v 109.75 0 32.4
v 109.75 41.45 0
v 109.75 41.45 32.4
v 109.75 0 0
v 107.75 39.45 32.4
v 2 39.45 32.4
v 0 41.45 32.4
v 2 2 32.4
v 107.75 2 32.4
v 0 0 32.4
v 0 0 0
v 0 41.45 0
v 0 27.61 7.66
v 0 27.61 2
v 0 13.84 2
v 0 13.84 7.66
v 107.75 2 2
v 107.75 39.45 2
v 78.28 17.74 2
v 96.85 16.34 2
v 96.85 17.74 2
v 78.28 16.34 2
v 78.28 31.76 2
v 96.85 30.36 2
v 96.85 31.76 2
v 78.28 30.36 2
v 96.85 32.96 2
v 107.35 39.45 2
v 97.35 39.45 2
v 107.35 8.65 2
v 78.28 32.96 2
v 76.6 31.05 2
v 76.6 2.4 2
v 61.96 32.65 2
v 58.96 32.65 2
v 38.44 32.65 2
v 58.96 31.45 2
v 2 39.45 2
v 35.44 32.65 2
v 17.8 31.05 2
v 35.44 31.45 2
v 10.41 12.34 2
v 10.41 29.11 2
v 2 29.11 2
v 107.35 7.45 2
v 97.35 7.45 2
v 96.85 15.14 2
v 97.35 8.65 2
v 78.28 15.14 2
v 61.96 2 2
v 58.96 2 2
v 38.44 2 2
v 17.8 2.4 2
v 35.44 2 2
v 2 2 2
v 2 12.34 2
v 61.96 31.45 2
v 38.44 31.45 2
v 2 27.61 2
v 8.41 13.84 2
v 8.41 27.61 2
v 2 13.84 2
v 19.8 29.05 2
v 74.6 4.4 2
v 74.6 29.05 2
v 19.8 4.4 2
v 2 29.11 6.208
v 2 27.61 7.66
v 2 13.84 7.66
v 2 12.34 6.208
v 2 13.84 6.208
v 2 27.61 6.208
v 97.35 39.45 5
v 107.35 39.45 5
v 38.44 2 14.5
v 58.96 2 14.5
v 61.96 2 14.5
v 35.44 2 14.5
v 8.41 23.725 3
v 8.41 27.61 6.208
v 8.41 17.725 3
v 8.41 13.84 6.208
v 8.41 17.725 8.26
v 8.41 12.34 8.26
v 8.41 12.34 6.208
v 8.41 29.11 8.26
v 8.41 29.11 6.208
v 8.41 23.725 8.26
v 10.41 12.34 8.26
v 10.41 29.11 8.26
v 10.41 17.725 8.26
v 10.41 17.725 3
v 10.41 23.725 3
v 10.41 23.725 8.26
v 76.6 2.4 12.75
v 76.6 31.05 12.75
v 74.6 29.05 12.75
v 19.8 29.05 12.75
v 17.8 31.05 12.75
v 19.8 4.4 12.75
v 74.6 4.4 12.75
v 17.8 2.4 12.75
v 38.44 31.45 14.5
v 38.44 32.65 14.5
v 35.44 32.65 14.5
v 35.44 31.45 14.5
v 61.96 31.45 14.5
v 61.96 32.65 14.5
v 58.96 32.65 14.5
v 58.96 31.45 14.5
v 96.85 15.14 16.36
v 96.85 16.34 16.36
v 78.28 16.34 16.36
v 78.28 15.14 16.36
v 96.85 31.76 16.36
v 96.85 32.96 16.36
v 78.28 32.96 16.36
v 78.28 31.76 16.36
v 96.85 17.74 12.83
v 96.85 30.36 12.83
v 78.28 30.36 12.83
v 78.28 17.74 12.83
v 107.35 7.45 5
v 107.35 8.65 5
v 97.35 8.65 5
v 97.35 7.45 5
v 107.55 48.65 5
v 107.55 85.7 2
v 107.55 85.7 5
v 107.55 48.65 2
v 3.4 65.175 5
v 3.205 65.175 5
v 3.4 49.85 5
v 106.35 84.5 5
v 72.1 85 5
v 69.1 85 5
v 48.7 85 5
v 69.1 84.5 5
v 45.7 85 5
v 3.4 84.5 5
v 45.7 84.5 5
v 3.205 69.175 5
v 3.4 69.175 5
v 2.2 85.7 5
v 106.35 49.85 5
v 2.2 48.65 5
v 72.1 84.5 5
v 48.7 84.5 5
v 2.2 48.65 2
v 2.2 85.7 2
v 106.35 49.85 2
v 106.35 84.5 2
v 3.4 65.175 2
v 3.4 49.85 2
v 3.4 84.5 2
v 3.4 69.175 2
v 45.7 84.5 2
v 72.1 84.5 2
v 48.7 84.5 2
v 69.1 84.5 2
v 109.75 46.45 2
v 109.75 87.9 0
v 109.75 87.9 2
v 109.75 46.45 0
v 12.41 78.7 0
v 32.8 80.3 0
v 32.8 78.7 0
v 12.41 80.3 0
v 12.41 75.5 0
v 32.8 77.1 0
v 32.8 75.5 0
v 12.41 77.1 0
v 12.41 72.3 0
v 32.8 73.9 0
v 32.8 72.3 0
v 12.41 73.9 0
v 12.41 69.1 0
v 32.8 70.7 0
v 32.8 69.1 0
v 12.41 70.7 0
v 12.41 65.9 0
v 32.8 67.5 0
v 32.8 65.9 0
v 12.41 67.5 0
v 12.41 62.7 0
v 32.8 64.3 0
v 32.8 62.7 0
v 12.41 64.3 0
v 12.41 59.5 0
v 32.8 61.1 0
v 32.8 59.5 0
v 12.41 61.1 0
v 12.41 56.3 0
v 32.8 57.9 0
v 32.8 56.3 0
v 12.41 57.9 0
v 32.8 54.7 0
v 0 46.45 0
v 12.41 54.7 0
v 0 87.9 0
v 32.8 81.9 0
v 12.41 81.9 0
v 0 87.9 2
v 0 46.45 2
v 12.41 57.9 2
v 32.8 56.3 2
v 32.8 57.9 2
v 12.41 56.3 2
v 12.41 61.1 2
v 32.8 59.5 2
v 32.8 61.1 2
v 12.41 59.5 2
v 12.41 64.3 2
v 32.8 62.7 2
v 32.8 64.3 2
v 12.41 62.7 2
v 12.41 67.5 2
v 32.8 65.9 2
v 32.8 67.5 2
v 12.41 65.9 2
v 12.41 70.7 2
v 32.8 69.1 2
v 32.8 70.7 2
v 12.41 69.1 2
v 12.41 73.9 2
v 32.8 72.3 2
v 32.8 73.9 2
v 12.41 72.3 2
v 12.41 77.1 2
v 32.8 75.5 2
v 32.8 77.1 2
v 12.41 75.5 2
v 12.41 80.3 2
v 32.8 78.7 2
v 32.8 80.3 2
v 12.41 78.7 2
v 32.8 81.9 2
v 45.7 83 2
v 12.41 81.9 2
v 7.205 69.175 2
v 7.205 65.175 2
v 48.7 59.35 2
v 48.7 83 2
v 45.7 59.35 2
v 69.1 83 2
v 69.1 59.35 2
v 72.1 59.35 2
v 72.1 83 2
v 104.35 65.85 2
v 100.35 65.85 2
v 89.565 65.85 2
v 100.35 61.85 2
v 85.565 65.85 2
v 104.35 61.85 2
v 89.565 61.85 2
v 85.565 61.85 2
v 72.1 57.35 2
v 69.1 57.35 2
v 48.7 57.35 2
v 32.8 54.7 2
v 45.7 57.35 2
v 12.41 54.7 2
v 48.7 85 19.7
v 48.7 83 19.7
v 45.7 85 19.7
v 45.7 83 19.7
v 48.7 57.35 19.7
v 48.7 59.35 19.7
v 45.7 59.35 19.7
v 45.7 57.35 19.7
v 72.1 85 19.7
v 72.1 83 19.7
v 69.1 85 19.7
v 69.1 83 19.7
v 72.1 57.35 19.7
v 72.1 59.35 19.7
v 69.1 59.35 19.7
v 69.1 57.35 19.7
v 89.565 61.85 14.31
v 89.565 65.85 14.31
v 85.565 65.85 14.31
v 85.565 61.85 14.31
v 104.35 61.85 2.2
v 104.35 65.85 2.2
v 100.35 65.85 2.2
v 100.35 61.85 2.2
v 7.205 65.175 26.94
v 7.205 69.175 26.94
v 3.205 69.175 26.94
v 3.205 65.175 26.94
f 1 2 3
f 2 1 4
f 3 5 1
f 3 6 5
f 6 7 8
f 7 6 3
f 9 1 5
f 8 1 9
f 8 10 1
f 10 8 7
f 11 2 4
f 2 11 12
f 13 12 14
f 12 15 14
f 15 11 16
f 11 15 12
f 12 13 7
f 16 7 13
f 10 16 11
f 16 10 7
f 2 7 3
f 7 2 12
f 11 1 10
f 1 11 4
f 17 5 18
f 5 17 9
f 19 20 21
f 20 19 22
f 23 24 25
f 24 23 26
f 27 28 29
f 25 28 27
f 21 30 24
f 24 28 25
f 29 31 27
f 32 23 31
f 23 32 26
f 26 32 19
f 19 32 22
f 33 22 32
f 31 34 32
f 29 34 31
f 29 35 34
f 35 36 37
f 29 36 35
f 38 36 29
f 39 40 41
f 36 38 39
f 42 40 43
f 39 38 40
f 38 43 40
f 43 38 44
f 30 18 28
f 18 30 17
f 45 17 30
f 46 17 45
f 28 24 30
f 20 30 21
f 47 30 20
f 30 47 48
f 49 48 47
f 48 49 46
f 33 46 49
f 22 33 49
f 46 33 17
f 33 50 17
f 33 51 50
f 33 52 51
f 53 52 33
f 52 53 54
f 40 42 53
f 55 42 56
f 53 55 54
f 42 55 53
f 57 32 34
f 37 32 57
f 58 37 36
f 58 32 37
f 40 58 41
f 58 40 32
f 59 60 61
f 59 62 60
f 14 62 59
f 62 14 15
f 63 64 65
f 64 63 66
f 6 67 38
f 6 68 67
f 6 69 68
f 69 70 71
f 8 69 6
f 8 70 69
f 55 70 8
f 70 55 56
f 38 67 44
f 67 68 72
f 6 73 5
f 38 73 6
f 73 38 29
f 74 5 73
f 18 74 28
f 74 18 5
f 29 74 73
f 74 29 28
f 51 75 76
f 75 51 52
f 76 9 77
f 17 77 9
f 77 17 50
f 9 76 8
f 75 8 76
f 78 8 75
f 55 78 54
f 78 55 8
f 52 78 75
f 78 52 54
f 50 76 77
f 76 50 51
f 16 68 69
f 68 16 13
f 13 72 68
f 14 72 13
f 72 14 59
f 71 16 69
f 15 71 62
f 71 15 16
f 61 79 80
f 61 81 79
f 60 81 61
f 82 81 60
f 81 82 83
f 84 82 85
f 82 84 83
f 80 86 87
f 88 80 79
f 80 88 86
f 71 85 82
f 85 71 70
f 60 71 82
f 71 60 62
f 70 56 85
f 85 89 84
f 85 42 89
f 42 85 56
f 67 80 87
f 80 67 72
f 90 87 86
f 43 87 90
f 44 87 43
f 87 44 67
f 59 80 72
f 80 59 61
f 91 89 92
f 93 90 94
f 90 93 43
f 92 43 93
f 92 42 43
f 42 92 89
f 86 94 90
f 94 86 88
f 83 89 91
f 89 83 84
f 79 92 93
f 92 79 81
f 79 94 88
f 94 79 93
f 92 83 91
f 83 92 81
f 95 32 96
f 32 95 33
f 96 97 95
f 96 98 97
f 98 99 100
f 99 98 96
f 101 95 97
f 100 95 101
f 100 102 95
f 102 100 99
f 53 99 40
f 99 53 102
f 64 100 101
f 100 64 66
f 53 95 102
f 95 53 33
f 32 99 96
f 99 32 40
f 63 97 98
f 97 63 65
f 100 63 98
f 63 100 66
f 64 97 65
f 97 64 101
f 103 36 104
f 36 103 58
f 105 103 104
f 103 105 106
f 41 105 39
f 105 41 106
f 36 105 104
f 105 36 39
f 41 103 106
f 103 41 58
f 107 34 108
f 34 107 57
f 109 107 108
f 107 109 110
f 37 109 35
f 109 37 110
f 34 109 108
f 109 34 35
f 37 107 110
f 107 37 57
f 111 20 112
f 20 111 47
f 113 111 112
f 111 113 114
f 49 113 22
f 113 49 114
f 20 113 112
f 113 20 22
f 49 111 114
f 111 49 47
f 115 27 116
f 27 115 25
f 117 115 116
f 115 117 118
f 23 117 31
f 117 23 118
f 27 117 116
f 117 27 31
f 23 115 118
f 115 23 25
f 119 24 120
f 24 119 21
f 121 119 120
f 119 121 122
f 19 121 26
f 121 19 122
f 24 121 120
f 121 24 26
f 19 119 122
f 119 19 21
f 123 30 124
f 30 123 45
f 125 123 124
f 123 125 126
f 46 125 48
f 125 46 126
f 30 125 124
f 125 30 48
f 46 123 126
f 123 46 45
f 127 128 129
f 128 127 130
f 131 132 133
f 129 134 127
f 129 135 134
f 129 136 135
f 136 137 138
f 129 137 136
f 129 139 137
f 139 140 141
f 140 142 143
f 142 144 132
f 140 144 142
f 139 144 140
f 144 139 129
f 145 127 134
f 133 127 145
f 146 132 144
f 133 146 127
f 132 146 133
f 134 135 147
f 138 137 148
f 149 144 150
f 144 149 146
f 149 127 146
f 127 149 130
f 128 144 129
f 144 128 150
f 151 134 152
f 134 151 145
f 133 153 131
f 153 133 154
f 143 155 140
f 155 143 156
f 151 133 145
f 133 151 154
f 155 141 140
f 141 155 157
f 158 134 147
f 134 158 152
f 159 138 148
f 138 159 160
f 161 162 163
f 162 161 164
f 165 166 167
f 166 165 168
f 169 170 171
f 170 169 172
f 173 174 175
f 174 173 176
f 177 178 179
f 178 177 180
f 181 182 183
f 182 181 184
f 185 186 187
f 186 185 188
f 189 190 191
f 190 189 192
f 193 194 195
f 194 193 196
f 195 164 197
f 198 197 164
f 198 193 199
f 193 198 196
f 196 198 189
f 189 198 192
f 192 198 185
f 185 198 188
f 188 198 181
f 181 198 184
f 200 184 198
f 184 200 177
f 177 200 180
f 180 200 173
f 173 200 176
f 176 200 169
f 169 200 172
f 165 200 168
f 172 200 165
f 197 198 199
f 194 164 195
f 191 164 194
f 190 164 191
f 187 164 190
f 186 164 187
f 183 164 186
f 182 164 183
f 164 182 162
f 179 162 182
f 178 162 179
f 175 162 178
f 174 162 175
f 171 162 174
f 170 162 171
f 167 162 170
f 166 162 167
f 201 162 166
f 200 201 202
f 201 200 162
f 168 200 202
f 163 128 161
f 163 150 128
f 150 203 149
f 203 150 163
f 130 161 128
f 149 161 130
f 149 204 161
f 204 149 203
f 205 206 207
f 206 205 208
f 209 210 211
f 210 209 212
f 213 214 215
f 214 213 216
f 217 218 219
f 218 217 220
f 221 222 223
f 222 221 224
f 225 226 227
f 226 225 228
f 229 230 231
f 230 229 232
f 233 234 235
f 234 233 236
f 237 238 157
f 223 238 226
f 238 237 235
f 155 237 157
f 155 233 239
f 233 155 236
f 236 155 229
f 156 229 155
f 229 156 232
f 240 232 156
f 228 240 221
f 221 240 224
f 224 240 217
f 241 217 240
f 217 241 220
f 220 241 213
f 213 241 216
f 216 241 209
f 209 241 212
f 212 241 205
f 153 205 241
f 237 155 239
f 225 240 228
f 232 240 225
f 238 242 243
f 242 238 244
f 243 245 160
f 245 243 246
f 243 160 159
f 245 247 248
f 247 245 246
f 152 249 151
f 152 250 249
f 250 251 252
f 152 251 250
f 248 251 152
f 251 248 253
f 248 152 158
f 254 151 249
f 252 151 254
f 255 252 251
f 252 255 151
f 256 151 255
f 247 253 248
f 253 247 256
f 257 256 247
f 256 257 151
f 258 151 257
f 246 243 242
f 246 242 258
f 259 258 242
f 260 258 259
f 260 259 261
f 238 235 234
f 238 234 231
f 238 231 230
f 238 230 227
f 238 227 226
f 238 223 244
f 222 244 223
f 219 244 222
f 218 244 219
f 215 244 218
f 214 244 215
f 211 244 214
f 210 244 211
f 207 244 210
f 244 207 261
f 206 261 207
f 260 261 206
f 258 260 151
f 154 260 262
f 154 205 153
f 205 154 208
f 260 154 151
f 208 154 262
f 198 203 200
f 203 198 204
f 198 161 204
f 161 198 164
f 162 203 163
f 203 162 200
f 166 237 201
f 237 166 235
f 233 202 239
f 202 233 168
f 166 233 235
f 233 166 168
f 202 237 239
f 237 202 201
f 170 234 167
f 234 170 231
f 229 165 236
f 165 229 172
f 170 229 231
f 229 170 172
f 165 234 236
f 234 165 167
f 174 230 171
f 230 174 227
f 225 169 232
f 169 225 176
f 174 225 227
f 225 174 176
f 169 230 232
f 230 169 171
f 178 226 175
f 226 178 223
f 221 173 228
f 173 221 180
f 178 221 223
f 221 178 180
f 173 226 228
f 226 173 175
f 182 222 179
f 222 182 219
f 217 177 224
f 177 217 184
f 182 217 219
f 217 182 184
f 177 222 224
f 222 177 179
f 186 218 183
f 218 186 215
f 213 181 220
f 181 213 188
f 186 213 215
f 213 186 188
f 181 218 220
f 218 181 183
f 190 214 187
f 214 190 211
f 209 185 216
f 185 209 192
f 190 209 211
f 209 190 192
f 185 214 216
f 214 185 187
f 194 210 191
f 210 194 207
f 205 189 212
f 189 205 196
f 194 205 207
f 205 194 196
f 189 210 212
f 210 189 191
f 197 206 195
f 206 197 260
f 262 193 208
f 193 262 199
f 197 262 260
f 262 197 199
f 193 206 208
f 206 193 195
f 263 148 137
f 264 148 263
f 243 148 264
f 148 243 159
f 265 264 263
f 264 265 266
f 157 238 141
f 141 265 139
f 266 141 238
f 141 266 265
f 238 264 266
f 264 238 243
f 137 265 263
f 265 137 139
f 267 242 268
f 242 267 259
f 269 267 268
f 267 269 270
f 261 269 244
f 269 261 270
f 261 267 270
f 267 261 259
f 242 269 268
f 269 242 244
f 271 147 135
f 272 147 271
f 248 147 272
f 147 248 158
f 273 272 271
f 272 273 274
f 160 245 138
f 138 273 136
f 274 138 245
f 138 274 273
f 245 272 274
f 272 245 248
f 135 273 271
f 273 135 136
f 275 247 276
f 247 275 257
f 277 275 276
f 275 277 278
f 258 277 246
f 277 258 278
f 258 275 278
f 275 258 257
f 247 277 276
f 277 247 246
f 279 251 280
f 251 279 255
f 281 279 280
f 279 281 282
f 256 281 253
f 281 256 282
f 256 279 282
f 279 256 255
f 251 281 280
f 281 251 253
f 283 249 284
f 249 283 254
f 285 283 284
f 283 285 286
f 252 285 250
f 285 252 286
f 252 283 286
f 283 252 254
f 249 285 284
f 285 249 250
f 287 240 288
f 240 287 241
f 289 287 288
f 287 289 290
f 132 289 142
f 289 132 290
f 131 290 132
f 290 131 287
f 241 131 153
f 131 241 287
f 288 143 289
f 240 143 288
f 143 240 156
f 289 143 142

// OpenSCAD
// Enclosure for wyze-esp-bridge:
//   USB-C power socket -> antenna overhang -> ESP32-S3-DevKitC-1 (flat, no headers)
//   -> USB-C-to-A OTG adapter -> Wyze Sense Bridge dongle standing like a plate across the +X end.
//
// All dimensions in mm. Parts are raised/offset automatically so the board's OTG port,
// the adapter and the dongle's USB-A plug line up; the case grows to fit.
// Render: F6, export STL: F7. Print base upright, lid plate-down (as laid out with part = "both").

/* [Part] */
part = "both"; // [both, base, lid]

/* [ESP32-S3 board] */
board_l = 58.8;    // PCB length (X), without antenna overhang
board_w = 28.65;   // PCB width (Y)
pcb_t = 1.75;      // PCB thickness
pin_h = 0;         // height of anything under the PCB (no headers soldered = 0)
comp_h = 3.0;      // tallest component above the PCB
port_off = 1.48;   // USB-C port centre above the PCB top
port_ovh = 1.18;   // USB-C ports stick out this far past the PCB edge (+X)
ant_ovh = 5.99;    // antenna overhang past the PCB (-X)
otg_y = 21.65;     // OTG port centre from the PCB's -Y edge
com_y = 7.0;       // COM port centre from the PCB's -Y edge (assumed mirror of otg_y; measure)

/* [OTG adapter, USB-C plug -> USB-A socket] */
otg_body = 20.75;  // PCB edge -> USB-A face, adapter plugged in
otg_bw = 14.62;    // body width (Y)
otg_bh = 7.06;     // body height (Z)
otg_cz = 3.15;     // USB-C plug centre above the body bottom
otg_az = 4.17;     // USB-A socket centre above the body bottom
otg_cy = 7.31;     // USB-C plug centre from the body's -Y side
otg_ay = 7.31;     // USB-A socket centre from the body's -Y side

/* [Wyze Sense Bridge dongle: PLACEHOLDERS, measure (back face toward you, plug horizontal)] */
dongle_w = 30;     // width (Y)
dongle_h = 30;     // height (Z)
dongle_t = 10;     // thickness (X), back face to front face, excluding the plug
plug_y = 15;       // plug centre from the dongle's -Y edge
plug_z = 15;       // plug centre above the dongle's bottom edge

/* [USB-C power socket (molded pigtail receptacle)] */
pwr_w = 13.37;     // width (Y)
pwr_h = 5.26;      // height (Z)
pwr_d = 8.21;      // body depth, front face -> wire exit (X)
pwr_clr = 0.2;     // fit clearance around the socket (snug; add a drop of glue)
pwr_notch = 6;     // wire notch width in the rear stop

/* [Case] */
wall = 2;
floor_t = 2;
lid_t = 2;
clr = 0.4;         // general fit clearance, tune for your printer
lip_h = 3;         // lid locating lip depth
lip_t = 1.2;       // lid lip thickness
tab_gap = 0.2;     // gap between hold-down tabs and the part they hold
tab_w = 4;         // hold-down tab footprint
vents = true;      // lid vents over the antenna end
com_slot = false;  // side slot for a right-angle USB-C cable into the COM port
com_slot_l = 12;   // slot length (X)
com_slot_h = 8;    // slot height (Z)
show_parts = false; // preview (F5) only: ghost models of the board, adapter, dongle and socket

$fn = 32;
eps = 0.01;

// ------------------------------------------------------------------ layout
// Interior coordinates: x = 0 at the inner -X wall face, y = 0 at the inner -Y wall face, z = 0 on the floor.

port_cz = pcb_t + port_off;  // port centre above the board bottom

// Z: lift the board until the adapter and the dongle clear the floor
zb = max(pin_h, otg_cz - port_cz, plug_z - otg_az + otg_cz - port_cz);
adp_z0 = zb + port_cz - otg_cz;
a_cz = adp_z0 + otg_az;
dng_z0 = a_cz - plug_z;

// X
stop_t = 2;
stop_x = pwr_d - wall + pwr_clr;          // socket front face sits flush with the outer wall
bay_l = stop_x + stop_t + 1;
bx0 = bay_l + ant_ovh + clr;              // board -X edge
bx1 = bx0 + board_l;                      // board +X edge (port side)
adp_x0 = bx1 + port_ovh;                  // adapter body start (approx.)
a_face = bx1 + otg_body;                  // USB-A face
dng_x1 = a_face + dongle_t;
in_l = dng_x1 + clr;

// Y (board frame: board -Y edge = 0)
adp_y0f = otg_y - otg_cy;
a_cyf = adp_y0f + otg_ay;
dng_y0f = a_cyf - plug_y;
y_min = min(0, adp_y0f, dng_y0f);
y_max = max(board_w, adp_y0f + otg_bw, dng_y0f + dongle_w);
by0 = clr - y_min;                        // board -Y edge in interior coordinates
in_w = max(y_max - y_min + 2 * clr, pwr_w + 2 * pwr_clr + 4);
adp_y0 = by0 + adp_y0f;
dng_y0 = by0 + dng_y0f;
pwr_yc = in_w / 2;

in_h = max(zb + pcb_t + comp_h, adp_z0 + otg_bh, dng_z0 + dongle_h, pwr_h + pwr_clr) + clr;

out_l = in_l + 2 * wall;
out_w = in_w + 2 * wall;
out_h = in_h + floor_t;

echo(str("Outer size (base): ", out_l, " x ", out_w, " x ", out_h, " mm, lid adds ", lid_t));
echo(str("Board lifted ", zb, " mm; adapter bottom ", adp_z0, "; dongle bottom ", dng_z0));
echo("WARNING: dongle_* and plug_* are placeholders until the Sense Bridge is measured.");

// ------------------------------------------------------------------ base

module in_frame() { translate([wall, wall, floor_t]) children(); }

module base() {
    difference() {
        cube([out_l, out_w, out_h]);
        in_frame() translate([0, 0, 0]) cube([in_l, in_w, in_h + eps]);
        // Power socket opening in the -X wall
        in_frame() translate([-wall - eps, pwr_yc - pwr_w / 2 - pwr_clr, 0])
            cube([wall + 2 * eps, pwr_w + 2 * pwr_clr, pwr_h + 2 * pwr_clr]);
        // Optional COM port side slot (-Y wall)
        if (com_slot)
            in_frame() translate([bx1 + port_ovh, -wall - eps, zb + port_cz - com_slot_h / 2])
                cube([com_slot_l, wall + 2 * eps, com_slot_h]);
    }
    in_frame() {
        power_cradle();
        board_supports();
        adapter_cradle();
        dongle_support();
    }
}

module power_cradle() {
    y0 = pwr_yc - pwr_w / 2 - pwr_clr;
    y1 = pwr_yc + pwr_w / 2 + pwr_clr;
    rail_h = pwr_h * 0.8;
    // Side guides
    for (y = [y0 - 1.5, y1]) translate([0, y, 0]) cube([stop_x, 1.5, rail_h]);
    // Rear stop with a wire notch
    difference() {
        translate([stop_x, y0 - 1.5, 0]) cube([stop_t, y1 - y0 + 3, pwr_h + 1]);
        translate([stop_x - eps, pwr_yc - pwr_notch / 2, 1]) cube([stop_t + 2 * eps, pwr_notch, pwr_h + 1]);
    }
}

module board_supports() {
    if (zb > 0.2) {
        // Rails under both long edges, plus a cross rib at each end
        for (y = [by0, by0 + board_w - 2]) translate([bx0, y, 0]) cube([board_l, 2, zb]);
        for (x = [bx0, bx1 - 2]) translate([x, by0, 0]) cube([2, board_w, zb]);
    }
    // Side locators: keep the board from sliding in Y
    loc_h = zb + pcb_t;
    for (x = [bx0 + board_l * 0.3, bx0 + board_l * 0.7]) {
        translate([x, by0 - clr - 1.2, 0]) cube([3, 1.2, loc_h]);
        translate([x, by0 + board_w + clr, 0]) cube([3, 1.2, loc_h]);
    }
}

module adapter_cradle() {
    len = a_face - adp_x0 - 1;
    // Support under the adapter body
    if (adp_z0 > 0.2) translate([adp_x0 + 0.5, adp_y0 + 1, 0]) cube([len, otg_bw - 2, adp_z0]);
    // Side walls to half the body height
    side_h = adp_z0 + otg_bh / 2;
    for (y = [adp_y0 - clr - 1.2, adp_y0 + otg_bw + clr])
        translate([adp_x0 + 0.5, y, 0]) cube([len, 1.2, side_h]);
}

module dongle_support() {
    if (dng_z0 > 0.2) translate([a_face + 0.5, dng_y0 + 1, 0]) cube([dongle_t - 1, dongle_w - 2, dng_z0]);
    // Low side guides
    for (y = [dng_y0 - clr - 1.2, dng_y0 + dongle_w + clr])
        translate([a_face, y, 0]) cube([dongle_t, 1.2, dng_z0 + 3]);
}

// ------------------------------------------------------------------ lid

// A hold-down tab hanging from the lid down to top_z (interior z) + tab_gap.
module tab(x, y, top_z, w = tab_w, d = tab_w) {
    len = in_h - top_z - tab_gap;
    if (len > 0) translate([x - w / 2, y - d / 2, top_z + tab_gap]) cube([w, d, len + eps]);
}

module lid() {
    difference() {
        union() {
            translate([0, 0, out_h]) cube([out_l, out_w, lid_t]);
            // Locating lip inside the walls
            in_frame() difference() {
                translate([clr / 2, clr / 2, in_h - lip_h]) cube([in_l - clr, in_w - clr, lip_h + eps]);
                translate([clr / 2 + lip_t, clr / 2 + lip_t, in_h - lip_h - eps])
                    cube([in_l - clr - 2 * lip_t, in_w - clr - 2 * lip_t, lip_h + 3 * eps]);
            }
        }
        if (vents) {
            vx0 = bay_l + 1;
            vx1 = bx0 + 15;
            for (y = [wall + 4 : 3.2 : out_w - wall - 5])
                translate([wall + vx0, y, out_h - eps]) cube([vx1 - vx0, 1.6, lid_t + 2 * eps]);
        }
    }
    in_frame() {
        // Board: press on the PCB edge strips
        for (x = [bx0 + board_l * 0.5, bx1 - 6])
            for (y = [by0 + 1.5, by0 + board_w - 1.5])
                tab(x, y, zb + pcb_t, w = 3, d = 2);
        tab((adp_x0 + a_face) / 2, adp_y0 + otg_bw / 2, adp_z0 + otg_bh);
        tab(a_face + dongle_t / 2, dng_y0 + dongle_w / 2, dng_z0 + dongle_h);
        tab(stop_x / 2, pwr_yc, pwr_h);
    }
}

// ------------------------------------------------------------------ fit check

module ghosts() {
    in_frame() {
        // Board + antenna overhang + components + ports
        color("green") translate([bx0, by0, zb]) cube([board_l, board_w, pcb_t]);
        color("green") translate([bx0 - ant_ovh, by0 + board_w / 2 - 9, zb]) cube([ant_ovh, 18, pcb_t]);
        color("silver") translate([bx0 + 2, by0 + 5, zb + pcb_t]) cube([25, 18, comp_h]);
        for (y = [otg_y, com_y]) color("silver")
            translate([bx1 - 6, by0 + y - 4.5, zb + port_cz - 1.6]) cube([6 + port_ovh, 9, 3.2]);
        color("gray") translate([adp_x0, adp_y0, adp_z0]) cube([a_face - adp_x0, otg_bw, otg_bh]);
        color("white") translate([a_face, dng_y0, dng_z0]) cube([dongle_t, dongle_w, dongle_h]);
        color("black") translate([-wall, pwr_yc - pwr_w / 2, 0]) cube([pwr_d, pwr_w, pwr_h]);
    }
}

// ------------------------------------------------------------------ output

if (show_parts) %ghosts();

if (part == "base" || part == "both") base();
if (part == "lid") translate([0, out_w, out_h + lid_t]) rotate([180, 0, 0]) lid();
if (part == "both") translate([0, 2 * out_w + 5, out_h + lid_t]) rotate([180, 0, 0]) lid();
